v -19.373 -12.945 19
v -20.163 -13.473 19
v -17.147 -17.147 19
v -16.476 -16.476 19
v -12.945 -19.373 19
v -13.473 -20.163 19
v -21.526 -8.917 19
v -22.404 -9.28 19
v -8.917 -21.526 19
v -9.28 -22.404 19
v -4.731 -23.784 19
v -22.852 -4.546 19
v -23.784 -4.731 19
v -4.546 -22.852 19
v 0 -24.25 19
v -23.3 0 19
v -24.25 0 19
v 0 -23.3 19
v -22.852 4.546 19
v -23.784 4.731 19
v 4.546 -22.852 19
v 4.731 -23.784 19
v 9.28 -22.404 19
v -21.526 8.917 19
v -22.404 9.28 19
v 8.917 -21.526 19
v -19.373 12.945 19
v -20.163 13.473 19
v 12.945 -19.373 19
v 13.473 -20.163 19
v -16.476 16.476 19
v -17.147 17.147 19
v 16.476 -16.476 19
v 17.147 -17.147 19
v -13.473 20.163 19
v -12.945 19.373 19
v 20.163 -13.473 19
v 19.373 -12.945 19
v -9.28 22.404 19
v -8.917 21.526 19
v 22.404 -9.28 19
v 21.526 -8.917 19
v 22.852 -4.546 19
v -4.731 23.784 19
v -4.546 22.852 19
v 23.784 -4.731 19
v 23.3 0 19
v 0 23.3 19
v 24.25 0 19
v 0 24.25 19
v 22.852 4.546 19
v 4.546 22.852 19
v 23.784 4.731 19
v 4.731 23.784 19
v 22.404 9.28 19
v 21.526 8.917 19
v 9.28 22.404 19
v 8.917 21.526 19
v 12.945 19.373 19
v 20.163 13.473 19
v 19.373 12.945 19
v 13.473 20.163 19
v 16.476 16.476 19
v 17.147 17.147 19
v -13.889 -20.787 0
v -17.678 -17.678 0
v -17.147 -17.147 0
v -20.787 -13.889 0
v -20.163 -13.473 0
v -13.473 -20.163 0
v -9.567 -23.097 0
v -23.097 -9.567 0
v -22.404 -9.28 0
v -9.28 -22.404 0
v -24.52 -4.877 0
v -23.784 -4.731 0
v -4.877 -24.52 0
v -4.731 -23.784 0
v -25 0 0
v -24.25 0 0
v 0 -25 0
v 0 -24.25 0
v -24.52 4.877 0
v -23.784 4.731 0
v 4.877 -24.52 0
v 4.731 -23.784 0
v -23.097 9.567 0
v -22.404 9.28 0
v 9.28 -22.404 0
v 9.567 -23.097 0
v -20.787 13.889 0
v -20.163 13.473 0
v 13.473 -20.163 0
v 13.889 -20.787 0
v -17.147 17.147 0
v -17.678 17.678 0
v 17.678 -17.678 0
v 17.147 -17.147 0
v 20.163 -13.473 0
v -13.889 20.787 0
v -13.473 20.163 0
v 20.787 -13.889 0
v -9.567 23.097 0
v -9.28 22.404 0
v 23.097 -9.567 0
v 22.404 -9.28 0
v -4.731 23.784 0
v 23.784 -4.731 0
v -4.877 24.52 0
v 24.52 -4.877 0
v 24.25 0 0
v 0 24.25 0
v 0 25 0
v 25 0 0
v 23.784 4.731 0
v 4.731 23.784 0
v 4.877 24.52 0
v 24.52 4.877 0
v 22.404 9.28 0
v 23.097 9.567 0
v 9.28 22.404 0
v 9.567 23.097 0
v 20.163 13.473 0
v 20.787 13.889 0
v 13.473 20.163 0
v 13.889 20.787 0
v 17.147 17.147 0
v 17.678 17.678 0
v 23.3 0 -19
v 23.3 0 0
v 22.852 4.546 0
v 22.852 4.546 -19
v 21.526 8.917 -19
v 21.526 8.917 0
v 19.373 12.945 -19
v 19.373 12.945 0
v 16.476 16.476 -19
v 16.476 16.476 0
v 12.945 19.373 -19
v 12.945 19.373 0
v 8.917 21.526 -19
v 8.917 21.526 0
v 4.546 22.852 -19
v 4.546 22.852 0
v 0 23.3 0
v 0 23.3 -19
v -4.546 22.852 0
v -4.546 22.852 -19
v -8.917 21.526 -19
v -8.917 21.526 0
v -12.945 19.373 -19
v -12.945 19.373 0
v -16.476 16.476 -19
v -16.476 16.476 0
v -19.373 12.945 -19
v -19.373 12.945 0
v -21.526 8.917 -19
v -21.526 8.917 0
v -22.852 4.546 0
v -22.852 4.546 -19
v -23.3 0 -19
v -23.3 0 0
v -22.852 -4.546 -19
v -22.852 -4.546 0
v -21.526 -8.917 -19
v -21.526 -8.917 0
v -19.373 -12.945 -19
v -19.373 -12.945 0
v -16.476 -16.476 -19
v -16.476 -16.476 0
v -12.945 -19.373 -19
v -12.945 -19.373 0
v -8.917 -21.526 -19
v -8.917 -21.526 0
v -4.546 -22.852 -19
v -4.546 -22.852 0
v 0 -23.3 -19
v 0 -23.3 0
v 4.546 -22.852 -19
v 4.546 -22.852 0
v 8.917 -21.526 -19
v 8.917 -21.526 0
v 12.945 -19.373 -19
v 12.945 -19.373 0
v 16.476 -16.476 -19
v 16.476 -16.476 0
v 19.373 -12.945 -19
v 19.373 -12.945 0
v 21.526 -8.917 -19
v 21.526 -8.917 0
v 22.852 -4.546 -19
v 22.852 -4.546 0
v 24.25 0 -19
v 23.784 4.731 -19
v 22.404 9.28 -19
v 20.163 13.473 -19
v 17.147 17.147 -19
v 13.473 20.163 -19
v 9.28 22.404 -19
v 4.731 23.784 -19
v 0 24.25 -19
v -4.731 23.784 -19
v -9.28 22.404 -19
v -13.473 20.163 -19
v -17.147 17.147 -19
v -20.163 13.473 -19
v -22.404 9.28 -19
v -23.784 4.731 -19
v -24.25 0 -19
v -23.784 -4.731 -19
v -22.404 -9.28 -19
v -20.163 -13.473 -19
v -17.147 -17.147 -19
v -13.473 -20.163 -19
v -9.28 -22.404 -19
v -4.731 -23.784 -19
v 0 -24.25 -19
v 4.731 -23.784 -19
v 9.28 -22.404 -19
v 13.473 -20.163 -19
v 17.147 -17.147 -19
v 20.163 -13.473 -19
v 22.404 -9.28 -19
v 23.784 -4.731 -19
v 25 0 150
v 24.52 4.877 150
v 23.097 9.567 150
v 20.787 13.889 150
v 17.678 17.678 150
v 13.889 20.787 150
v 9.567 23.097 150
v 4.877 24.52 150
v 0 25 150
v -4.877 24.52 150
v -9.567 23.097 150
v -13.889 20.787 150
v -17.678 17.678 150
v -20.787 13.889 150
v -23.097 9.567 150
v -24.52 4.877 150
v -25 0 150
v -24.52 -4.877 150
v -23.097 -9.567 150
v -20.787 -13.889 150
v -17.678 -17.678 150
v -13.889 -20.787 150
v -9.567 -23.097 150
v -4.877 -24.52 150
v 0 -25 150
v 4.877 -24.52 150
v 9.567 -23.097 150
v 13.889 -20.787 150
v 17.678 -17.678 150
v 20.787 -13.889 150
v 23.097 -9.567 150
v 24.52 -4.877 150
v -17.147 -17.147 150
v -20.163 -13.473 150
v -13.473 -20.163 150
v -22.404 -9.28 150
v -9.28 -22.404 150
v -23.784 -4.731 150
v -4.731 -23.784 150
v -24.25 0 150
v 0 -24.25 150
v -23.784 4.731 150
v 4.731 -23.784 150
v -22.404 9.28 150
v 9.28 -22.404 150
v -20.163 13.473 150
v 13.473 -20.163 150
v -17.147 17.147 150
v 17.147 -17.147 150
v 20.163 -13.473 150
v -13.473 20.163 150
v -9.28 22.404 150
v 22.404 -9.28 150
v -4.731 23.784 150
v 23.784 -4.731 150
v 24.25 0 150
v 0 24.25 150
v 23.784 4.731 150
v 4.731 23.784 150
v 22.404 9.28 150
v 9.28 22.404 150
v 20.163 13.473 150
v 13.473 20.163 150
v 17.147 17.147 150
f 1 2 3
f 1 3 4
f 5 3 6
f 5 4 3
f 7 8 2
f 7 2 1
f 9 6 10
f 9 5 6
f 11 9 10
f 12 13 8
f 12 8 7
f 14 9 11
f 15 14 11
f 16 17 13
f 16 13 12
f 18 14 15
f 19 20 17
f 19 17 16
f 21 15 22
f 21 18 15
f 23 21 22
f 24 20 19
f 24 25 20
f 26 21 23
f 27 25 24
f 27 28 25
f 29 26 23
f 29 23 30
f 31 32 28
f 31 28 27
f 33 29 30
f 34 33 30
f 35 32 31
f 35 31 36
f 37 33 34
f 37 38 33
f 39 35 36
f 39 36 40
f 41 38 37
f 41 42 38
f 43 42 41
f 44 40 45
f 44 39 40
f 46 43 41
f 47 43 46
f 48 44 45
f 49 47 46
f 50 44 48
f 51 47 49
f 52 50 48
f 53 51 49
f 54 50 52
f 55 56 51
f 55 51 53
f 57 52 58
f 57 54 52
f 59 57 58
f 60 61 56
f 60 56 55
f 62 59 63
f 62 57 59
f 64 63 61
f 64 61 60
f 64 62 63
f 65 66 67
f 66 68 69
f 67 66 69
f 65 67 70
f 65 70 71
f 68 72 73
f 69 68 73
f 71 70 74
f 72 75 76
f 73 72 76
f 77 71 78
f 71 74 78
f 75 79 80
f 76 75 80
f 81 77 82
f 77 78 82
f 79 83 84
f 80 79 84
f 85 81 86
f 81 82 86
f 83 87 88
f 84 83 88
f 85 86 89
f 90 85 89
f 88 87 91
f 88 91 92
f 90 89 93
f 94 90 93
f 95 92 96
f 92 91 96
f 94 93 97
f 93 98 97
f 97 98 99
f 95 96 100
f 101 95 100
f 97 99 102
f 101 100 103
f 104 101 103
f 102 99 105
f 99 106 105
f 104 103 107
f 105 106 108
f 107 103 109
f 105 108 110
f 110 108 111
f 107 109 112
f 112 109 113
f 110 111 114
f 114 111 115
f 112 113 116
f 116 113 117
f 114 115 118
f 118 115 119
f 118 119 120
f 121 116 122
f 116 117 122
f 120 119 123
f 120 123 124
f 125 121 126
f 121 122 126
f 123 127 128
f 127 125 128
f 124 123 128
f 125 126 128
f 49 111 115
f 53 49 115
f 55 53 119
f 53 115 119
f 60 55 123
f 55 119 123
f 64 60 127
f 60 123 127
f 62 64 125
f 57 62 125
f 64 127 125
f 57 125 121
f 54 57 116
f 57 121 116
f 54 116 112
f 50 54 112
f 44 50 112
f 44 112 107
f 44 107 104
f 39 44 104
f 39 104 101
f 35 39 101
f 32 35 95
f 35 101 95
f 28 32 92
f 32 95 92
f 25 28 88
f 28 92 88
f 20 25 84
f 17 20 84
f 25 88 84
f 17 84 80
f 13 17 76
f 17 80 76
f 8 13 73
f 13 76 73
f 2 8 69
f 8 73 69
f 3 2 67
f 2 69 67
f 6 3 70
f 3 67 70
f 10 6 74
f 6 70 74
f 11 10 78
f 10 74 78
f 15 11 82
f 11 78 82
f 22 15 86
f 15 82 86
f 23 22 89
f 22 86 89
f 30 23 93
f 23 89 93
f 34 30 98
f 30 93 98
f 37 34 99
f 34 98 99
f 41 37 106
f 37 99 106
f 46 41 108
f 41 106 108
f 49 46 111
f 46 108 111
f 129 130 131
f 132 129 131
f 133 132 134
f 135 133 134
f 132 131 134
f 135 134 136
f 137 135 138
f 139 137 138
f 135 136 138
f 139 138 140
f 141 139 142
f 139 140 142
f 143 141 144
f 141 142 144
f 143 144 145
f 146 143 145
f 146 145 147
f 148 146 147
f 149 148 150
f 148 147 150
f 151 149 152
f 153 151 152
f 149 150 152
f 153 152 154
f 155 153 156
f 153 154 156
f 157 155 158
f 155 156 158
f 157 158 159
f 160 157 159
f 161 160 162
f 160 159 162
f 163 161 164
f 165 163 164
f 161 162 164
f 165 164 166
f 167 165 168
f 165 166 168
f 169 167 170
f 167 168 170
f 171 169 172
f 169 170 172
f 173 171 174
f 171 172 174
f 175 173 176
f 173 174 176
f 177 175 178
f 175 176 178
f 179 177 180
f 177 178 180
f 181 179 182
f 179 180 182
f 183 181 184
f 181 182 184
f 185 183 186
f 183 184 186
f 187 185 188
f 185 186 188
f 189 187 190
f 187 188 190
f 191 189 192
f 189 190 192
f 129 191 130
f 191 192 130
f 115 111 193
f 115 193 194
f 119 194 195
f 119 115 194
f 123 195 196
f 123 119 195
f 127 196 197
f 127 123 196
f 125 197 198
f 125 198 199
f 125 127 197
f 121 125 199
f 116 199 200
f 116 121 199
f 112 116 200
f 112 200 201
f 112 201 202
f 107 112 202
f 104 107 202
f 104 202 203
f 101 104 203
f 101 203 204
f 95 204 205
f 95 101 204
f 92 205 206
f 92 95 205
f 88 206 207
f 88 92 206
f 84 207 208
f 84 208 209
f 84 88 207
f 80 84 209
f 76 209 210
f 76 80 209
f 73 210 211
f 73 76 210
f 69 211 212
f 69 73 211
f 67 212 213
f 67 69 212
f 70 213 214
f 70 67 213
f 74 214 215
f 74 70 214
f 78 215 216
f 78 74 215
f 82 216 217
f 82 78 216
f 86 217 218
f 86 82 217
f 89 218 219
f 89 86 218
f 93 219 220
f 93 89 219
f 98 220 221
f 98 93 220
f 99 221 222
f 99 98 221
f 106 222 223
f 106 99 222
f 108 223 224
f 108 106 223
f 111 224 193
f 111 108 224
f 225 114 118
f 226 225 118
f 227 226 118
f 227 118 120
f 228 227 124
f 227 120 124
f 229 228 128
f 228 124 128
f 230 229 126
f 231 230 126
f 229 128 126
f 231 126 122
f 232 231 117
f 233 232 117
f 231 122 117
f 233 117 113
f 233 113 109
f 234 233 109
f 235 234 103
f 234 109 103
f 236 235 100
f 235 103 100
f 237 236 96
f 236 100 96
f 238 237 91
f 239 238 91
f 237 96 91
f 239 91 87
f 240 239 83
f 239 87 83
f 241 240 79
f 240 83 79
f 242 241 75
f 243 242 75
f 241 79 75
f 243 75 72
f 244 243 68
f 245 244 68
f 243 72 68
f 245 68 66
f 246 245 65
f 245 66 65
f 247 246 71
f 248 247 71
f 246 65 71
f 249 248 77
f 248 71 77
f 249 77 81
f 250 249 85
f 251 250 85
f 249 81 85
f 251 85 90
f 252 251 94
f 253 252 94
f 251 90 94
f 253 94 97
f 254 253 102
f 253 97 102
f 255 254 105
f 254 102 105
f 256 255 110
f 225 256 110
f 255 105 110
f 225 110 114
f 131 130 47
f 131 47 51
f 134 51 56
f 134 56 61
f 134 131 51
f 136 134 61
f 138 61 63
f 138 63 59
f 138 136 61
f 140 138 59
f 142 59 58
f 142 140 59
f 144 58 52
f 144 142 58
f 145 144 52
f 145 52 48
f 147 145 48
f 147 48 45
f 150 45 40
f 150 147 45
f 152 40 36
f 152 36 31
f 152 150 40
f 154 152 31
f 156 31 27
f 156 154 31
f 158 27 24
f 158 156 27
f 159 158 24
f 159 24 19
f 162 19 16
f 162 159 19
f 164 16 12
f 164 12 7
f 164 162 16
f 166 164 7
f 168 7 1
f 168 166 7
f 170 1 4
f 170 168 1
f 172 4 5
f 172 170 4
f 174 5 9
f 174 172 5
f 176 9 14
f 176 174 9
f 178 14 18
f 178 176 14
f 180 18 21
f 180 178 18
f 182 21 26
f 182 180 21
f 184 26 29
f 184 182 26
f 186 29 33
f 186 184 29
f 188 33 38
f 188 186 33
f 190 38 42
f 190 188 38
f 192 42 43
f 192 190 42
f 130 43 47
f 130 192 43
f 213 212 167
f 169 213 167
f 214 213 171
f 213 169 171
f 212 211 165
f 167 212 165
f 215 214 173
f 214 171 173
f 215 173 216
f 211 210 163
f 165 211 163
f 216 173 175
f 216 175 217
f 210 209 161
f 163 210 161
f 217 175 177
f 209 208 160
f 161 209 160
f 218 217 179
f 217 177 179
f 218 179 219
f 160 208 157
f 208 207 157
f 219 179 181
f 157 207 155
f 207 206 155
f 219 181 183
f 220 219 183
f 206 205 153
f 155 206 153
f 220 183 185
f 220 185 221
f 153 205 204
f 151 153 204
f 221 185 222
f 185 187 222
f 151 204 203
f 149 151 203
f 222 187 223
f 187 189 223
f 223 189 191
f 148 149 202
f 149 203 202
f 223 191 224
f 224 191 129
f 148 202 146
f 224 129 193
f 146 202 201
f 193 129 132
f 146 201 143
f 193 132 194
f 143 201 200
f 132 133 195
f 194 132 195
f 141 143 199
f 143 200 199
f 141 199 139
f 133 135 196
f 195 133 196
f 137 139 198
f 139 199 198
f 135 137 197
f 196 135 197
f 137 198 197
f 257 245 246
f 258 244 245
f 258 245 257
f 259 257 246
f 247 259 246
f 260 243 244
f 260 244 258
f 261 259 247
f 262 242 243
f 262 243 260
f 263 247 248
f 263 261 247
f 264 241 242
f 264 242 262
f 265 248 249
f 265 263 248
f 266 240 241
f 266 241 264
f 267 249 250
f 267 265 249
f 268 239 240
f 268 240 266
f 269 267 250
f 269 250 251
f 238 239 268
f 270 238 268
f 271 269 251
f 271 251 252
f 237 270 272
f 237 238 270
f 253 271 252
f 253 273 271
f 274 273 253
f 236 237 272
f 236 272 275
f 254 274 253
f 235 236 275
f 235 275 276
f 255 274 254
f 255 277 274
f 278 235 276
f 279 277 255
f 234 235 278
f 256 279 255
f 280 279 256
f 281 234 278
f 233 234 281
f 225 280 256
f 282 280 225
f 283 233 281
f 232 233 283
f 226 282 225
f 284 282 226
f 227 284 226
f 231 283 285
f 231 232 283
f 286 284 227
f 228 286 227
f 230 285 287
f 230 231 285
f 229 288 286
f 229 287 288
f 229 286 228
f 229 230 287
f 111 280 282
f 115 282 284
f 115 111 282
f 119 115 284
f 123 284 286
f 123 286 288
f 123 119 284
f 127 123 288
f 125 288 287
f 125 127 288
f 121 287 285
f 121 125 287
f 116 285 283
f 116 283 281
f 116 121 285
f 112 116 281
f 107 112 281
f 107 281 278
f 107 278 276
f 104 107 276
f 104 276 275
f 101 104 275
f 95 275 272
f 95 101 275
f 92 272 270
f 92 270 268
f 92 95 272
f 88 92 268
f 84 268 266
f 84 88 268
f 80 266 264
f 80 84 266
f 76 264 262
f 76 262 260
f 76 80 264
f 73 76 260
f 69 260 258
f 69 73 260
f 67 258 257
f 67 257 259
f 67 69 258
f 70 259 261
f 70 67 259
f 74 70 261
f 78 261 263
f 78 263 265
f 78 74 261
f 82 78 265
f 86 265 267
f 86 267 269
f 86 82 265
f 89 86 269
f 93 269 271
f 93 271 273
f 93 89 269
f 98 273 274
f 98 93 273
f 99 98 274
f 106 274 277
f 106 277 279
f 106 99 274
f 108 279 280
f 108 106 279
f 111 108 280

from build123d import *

# Parameters (mm, degrees)
F0_R          = 25
F0_R_2        = 24.25
F1_DEPTH      = 150
F0_R_3        = 23.3
F2_DEPTH      = 19
F2_DEPTH_BACK = 19


with BuildPart() as f1:
    # F0 (on Top) → F1 (new body)
    with BuildSketch(Plane.XY):
        Circle(F0_R)
        Circle(F0_R_2, mode=Mode.SUBTRACT)
    extrude(amount=F1_DEPTH)


with BuildPart() as f2:
    # F0 (on Top) → F2 (new body, two sides)
    with BuildSketch(Plane.XY) as f2_sk:
        Circle(F0_R_2)
        Circle(F0_R_3, mode=Mode.SUBTRACT)
    extrude(amount=-F2_DEPTH)
    extrude(f2_sk.sketch, amount=F2_DEPTH_BACK)


solid = Compound([f1.part, f2.part])
